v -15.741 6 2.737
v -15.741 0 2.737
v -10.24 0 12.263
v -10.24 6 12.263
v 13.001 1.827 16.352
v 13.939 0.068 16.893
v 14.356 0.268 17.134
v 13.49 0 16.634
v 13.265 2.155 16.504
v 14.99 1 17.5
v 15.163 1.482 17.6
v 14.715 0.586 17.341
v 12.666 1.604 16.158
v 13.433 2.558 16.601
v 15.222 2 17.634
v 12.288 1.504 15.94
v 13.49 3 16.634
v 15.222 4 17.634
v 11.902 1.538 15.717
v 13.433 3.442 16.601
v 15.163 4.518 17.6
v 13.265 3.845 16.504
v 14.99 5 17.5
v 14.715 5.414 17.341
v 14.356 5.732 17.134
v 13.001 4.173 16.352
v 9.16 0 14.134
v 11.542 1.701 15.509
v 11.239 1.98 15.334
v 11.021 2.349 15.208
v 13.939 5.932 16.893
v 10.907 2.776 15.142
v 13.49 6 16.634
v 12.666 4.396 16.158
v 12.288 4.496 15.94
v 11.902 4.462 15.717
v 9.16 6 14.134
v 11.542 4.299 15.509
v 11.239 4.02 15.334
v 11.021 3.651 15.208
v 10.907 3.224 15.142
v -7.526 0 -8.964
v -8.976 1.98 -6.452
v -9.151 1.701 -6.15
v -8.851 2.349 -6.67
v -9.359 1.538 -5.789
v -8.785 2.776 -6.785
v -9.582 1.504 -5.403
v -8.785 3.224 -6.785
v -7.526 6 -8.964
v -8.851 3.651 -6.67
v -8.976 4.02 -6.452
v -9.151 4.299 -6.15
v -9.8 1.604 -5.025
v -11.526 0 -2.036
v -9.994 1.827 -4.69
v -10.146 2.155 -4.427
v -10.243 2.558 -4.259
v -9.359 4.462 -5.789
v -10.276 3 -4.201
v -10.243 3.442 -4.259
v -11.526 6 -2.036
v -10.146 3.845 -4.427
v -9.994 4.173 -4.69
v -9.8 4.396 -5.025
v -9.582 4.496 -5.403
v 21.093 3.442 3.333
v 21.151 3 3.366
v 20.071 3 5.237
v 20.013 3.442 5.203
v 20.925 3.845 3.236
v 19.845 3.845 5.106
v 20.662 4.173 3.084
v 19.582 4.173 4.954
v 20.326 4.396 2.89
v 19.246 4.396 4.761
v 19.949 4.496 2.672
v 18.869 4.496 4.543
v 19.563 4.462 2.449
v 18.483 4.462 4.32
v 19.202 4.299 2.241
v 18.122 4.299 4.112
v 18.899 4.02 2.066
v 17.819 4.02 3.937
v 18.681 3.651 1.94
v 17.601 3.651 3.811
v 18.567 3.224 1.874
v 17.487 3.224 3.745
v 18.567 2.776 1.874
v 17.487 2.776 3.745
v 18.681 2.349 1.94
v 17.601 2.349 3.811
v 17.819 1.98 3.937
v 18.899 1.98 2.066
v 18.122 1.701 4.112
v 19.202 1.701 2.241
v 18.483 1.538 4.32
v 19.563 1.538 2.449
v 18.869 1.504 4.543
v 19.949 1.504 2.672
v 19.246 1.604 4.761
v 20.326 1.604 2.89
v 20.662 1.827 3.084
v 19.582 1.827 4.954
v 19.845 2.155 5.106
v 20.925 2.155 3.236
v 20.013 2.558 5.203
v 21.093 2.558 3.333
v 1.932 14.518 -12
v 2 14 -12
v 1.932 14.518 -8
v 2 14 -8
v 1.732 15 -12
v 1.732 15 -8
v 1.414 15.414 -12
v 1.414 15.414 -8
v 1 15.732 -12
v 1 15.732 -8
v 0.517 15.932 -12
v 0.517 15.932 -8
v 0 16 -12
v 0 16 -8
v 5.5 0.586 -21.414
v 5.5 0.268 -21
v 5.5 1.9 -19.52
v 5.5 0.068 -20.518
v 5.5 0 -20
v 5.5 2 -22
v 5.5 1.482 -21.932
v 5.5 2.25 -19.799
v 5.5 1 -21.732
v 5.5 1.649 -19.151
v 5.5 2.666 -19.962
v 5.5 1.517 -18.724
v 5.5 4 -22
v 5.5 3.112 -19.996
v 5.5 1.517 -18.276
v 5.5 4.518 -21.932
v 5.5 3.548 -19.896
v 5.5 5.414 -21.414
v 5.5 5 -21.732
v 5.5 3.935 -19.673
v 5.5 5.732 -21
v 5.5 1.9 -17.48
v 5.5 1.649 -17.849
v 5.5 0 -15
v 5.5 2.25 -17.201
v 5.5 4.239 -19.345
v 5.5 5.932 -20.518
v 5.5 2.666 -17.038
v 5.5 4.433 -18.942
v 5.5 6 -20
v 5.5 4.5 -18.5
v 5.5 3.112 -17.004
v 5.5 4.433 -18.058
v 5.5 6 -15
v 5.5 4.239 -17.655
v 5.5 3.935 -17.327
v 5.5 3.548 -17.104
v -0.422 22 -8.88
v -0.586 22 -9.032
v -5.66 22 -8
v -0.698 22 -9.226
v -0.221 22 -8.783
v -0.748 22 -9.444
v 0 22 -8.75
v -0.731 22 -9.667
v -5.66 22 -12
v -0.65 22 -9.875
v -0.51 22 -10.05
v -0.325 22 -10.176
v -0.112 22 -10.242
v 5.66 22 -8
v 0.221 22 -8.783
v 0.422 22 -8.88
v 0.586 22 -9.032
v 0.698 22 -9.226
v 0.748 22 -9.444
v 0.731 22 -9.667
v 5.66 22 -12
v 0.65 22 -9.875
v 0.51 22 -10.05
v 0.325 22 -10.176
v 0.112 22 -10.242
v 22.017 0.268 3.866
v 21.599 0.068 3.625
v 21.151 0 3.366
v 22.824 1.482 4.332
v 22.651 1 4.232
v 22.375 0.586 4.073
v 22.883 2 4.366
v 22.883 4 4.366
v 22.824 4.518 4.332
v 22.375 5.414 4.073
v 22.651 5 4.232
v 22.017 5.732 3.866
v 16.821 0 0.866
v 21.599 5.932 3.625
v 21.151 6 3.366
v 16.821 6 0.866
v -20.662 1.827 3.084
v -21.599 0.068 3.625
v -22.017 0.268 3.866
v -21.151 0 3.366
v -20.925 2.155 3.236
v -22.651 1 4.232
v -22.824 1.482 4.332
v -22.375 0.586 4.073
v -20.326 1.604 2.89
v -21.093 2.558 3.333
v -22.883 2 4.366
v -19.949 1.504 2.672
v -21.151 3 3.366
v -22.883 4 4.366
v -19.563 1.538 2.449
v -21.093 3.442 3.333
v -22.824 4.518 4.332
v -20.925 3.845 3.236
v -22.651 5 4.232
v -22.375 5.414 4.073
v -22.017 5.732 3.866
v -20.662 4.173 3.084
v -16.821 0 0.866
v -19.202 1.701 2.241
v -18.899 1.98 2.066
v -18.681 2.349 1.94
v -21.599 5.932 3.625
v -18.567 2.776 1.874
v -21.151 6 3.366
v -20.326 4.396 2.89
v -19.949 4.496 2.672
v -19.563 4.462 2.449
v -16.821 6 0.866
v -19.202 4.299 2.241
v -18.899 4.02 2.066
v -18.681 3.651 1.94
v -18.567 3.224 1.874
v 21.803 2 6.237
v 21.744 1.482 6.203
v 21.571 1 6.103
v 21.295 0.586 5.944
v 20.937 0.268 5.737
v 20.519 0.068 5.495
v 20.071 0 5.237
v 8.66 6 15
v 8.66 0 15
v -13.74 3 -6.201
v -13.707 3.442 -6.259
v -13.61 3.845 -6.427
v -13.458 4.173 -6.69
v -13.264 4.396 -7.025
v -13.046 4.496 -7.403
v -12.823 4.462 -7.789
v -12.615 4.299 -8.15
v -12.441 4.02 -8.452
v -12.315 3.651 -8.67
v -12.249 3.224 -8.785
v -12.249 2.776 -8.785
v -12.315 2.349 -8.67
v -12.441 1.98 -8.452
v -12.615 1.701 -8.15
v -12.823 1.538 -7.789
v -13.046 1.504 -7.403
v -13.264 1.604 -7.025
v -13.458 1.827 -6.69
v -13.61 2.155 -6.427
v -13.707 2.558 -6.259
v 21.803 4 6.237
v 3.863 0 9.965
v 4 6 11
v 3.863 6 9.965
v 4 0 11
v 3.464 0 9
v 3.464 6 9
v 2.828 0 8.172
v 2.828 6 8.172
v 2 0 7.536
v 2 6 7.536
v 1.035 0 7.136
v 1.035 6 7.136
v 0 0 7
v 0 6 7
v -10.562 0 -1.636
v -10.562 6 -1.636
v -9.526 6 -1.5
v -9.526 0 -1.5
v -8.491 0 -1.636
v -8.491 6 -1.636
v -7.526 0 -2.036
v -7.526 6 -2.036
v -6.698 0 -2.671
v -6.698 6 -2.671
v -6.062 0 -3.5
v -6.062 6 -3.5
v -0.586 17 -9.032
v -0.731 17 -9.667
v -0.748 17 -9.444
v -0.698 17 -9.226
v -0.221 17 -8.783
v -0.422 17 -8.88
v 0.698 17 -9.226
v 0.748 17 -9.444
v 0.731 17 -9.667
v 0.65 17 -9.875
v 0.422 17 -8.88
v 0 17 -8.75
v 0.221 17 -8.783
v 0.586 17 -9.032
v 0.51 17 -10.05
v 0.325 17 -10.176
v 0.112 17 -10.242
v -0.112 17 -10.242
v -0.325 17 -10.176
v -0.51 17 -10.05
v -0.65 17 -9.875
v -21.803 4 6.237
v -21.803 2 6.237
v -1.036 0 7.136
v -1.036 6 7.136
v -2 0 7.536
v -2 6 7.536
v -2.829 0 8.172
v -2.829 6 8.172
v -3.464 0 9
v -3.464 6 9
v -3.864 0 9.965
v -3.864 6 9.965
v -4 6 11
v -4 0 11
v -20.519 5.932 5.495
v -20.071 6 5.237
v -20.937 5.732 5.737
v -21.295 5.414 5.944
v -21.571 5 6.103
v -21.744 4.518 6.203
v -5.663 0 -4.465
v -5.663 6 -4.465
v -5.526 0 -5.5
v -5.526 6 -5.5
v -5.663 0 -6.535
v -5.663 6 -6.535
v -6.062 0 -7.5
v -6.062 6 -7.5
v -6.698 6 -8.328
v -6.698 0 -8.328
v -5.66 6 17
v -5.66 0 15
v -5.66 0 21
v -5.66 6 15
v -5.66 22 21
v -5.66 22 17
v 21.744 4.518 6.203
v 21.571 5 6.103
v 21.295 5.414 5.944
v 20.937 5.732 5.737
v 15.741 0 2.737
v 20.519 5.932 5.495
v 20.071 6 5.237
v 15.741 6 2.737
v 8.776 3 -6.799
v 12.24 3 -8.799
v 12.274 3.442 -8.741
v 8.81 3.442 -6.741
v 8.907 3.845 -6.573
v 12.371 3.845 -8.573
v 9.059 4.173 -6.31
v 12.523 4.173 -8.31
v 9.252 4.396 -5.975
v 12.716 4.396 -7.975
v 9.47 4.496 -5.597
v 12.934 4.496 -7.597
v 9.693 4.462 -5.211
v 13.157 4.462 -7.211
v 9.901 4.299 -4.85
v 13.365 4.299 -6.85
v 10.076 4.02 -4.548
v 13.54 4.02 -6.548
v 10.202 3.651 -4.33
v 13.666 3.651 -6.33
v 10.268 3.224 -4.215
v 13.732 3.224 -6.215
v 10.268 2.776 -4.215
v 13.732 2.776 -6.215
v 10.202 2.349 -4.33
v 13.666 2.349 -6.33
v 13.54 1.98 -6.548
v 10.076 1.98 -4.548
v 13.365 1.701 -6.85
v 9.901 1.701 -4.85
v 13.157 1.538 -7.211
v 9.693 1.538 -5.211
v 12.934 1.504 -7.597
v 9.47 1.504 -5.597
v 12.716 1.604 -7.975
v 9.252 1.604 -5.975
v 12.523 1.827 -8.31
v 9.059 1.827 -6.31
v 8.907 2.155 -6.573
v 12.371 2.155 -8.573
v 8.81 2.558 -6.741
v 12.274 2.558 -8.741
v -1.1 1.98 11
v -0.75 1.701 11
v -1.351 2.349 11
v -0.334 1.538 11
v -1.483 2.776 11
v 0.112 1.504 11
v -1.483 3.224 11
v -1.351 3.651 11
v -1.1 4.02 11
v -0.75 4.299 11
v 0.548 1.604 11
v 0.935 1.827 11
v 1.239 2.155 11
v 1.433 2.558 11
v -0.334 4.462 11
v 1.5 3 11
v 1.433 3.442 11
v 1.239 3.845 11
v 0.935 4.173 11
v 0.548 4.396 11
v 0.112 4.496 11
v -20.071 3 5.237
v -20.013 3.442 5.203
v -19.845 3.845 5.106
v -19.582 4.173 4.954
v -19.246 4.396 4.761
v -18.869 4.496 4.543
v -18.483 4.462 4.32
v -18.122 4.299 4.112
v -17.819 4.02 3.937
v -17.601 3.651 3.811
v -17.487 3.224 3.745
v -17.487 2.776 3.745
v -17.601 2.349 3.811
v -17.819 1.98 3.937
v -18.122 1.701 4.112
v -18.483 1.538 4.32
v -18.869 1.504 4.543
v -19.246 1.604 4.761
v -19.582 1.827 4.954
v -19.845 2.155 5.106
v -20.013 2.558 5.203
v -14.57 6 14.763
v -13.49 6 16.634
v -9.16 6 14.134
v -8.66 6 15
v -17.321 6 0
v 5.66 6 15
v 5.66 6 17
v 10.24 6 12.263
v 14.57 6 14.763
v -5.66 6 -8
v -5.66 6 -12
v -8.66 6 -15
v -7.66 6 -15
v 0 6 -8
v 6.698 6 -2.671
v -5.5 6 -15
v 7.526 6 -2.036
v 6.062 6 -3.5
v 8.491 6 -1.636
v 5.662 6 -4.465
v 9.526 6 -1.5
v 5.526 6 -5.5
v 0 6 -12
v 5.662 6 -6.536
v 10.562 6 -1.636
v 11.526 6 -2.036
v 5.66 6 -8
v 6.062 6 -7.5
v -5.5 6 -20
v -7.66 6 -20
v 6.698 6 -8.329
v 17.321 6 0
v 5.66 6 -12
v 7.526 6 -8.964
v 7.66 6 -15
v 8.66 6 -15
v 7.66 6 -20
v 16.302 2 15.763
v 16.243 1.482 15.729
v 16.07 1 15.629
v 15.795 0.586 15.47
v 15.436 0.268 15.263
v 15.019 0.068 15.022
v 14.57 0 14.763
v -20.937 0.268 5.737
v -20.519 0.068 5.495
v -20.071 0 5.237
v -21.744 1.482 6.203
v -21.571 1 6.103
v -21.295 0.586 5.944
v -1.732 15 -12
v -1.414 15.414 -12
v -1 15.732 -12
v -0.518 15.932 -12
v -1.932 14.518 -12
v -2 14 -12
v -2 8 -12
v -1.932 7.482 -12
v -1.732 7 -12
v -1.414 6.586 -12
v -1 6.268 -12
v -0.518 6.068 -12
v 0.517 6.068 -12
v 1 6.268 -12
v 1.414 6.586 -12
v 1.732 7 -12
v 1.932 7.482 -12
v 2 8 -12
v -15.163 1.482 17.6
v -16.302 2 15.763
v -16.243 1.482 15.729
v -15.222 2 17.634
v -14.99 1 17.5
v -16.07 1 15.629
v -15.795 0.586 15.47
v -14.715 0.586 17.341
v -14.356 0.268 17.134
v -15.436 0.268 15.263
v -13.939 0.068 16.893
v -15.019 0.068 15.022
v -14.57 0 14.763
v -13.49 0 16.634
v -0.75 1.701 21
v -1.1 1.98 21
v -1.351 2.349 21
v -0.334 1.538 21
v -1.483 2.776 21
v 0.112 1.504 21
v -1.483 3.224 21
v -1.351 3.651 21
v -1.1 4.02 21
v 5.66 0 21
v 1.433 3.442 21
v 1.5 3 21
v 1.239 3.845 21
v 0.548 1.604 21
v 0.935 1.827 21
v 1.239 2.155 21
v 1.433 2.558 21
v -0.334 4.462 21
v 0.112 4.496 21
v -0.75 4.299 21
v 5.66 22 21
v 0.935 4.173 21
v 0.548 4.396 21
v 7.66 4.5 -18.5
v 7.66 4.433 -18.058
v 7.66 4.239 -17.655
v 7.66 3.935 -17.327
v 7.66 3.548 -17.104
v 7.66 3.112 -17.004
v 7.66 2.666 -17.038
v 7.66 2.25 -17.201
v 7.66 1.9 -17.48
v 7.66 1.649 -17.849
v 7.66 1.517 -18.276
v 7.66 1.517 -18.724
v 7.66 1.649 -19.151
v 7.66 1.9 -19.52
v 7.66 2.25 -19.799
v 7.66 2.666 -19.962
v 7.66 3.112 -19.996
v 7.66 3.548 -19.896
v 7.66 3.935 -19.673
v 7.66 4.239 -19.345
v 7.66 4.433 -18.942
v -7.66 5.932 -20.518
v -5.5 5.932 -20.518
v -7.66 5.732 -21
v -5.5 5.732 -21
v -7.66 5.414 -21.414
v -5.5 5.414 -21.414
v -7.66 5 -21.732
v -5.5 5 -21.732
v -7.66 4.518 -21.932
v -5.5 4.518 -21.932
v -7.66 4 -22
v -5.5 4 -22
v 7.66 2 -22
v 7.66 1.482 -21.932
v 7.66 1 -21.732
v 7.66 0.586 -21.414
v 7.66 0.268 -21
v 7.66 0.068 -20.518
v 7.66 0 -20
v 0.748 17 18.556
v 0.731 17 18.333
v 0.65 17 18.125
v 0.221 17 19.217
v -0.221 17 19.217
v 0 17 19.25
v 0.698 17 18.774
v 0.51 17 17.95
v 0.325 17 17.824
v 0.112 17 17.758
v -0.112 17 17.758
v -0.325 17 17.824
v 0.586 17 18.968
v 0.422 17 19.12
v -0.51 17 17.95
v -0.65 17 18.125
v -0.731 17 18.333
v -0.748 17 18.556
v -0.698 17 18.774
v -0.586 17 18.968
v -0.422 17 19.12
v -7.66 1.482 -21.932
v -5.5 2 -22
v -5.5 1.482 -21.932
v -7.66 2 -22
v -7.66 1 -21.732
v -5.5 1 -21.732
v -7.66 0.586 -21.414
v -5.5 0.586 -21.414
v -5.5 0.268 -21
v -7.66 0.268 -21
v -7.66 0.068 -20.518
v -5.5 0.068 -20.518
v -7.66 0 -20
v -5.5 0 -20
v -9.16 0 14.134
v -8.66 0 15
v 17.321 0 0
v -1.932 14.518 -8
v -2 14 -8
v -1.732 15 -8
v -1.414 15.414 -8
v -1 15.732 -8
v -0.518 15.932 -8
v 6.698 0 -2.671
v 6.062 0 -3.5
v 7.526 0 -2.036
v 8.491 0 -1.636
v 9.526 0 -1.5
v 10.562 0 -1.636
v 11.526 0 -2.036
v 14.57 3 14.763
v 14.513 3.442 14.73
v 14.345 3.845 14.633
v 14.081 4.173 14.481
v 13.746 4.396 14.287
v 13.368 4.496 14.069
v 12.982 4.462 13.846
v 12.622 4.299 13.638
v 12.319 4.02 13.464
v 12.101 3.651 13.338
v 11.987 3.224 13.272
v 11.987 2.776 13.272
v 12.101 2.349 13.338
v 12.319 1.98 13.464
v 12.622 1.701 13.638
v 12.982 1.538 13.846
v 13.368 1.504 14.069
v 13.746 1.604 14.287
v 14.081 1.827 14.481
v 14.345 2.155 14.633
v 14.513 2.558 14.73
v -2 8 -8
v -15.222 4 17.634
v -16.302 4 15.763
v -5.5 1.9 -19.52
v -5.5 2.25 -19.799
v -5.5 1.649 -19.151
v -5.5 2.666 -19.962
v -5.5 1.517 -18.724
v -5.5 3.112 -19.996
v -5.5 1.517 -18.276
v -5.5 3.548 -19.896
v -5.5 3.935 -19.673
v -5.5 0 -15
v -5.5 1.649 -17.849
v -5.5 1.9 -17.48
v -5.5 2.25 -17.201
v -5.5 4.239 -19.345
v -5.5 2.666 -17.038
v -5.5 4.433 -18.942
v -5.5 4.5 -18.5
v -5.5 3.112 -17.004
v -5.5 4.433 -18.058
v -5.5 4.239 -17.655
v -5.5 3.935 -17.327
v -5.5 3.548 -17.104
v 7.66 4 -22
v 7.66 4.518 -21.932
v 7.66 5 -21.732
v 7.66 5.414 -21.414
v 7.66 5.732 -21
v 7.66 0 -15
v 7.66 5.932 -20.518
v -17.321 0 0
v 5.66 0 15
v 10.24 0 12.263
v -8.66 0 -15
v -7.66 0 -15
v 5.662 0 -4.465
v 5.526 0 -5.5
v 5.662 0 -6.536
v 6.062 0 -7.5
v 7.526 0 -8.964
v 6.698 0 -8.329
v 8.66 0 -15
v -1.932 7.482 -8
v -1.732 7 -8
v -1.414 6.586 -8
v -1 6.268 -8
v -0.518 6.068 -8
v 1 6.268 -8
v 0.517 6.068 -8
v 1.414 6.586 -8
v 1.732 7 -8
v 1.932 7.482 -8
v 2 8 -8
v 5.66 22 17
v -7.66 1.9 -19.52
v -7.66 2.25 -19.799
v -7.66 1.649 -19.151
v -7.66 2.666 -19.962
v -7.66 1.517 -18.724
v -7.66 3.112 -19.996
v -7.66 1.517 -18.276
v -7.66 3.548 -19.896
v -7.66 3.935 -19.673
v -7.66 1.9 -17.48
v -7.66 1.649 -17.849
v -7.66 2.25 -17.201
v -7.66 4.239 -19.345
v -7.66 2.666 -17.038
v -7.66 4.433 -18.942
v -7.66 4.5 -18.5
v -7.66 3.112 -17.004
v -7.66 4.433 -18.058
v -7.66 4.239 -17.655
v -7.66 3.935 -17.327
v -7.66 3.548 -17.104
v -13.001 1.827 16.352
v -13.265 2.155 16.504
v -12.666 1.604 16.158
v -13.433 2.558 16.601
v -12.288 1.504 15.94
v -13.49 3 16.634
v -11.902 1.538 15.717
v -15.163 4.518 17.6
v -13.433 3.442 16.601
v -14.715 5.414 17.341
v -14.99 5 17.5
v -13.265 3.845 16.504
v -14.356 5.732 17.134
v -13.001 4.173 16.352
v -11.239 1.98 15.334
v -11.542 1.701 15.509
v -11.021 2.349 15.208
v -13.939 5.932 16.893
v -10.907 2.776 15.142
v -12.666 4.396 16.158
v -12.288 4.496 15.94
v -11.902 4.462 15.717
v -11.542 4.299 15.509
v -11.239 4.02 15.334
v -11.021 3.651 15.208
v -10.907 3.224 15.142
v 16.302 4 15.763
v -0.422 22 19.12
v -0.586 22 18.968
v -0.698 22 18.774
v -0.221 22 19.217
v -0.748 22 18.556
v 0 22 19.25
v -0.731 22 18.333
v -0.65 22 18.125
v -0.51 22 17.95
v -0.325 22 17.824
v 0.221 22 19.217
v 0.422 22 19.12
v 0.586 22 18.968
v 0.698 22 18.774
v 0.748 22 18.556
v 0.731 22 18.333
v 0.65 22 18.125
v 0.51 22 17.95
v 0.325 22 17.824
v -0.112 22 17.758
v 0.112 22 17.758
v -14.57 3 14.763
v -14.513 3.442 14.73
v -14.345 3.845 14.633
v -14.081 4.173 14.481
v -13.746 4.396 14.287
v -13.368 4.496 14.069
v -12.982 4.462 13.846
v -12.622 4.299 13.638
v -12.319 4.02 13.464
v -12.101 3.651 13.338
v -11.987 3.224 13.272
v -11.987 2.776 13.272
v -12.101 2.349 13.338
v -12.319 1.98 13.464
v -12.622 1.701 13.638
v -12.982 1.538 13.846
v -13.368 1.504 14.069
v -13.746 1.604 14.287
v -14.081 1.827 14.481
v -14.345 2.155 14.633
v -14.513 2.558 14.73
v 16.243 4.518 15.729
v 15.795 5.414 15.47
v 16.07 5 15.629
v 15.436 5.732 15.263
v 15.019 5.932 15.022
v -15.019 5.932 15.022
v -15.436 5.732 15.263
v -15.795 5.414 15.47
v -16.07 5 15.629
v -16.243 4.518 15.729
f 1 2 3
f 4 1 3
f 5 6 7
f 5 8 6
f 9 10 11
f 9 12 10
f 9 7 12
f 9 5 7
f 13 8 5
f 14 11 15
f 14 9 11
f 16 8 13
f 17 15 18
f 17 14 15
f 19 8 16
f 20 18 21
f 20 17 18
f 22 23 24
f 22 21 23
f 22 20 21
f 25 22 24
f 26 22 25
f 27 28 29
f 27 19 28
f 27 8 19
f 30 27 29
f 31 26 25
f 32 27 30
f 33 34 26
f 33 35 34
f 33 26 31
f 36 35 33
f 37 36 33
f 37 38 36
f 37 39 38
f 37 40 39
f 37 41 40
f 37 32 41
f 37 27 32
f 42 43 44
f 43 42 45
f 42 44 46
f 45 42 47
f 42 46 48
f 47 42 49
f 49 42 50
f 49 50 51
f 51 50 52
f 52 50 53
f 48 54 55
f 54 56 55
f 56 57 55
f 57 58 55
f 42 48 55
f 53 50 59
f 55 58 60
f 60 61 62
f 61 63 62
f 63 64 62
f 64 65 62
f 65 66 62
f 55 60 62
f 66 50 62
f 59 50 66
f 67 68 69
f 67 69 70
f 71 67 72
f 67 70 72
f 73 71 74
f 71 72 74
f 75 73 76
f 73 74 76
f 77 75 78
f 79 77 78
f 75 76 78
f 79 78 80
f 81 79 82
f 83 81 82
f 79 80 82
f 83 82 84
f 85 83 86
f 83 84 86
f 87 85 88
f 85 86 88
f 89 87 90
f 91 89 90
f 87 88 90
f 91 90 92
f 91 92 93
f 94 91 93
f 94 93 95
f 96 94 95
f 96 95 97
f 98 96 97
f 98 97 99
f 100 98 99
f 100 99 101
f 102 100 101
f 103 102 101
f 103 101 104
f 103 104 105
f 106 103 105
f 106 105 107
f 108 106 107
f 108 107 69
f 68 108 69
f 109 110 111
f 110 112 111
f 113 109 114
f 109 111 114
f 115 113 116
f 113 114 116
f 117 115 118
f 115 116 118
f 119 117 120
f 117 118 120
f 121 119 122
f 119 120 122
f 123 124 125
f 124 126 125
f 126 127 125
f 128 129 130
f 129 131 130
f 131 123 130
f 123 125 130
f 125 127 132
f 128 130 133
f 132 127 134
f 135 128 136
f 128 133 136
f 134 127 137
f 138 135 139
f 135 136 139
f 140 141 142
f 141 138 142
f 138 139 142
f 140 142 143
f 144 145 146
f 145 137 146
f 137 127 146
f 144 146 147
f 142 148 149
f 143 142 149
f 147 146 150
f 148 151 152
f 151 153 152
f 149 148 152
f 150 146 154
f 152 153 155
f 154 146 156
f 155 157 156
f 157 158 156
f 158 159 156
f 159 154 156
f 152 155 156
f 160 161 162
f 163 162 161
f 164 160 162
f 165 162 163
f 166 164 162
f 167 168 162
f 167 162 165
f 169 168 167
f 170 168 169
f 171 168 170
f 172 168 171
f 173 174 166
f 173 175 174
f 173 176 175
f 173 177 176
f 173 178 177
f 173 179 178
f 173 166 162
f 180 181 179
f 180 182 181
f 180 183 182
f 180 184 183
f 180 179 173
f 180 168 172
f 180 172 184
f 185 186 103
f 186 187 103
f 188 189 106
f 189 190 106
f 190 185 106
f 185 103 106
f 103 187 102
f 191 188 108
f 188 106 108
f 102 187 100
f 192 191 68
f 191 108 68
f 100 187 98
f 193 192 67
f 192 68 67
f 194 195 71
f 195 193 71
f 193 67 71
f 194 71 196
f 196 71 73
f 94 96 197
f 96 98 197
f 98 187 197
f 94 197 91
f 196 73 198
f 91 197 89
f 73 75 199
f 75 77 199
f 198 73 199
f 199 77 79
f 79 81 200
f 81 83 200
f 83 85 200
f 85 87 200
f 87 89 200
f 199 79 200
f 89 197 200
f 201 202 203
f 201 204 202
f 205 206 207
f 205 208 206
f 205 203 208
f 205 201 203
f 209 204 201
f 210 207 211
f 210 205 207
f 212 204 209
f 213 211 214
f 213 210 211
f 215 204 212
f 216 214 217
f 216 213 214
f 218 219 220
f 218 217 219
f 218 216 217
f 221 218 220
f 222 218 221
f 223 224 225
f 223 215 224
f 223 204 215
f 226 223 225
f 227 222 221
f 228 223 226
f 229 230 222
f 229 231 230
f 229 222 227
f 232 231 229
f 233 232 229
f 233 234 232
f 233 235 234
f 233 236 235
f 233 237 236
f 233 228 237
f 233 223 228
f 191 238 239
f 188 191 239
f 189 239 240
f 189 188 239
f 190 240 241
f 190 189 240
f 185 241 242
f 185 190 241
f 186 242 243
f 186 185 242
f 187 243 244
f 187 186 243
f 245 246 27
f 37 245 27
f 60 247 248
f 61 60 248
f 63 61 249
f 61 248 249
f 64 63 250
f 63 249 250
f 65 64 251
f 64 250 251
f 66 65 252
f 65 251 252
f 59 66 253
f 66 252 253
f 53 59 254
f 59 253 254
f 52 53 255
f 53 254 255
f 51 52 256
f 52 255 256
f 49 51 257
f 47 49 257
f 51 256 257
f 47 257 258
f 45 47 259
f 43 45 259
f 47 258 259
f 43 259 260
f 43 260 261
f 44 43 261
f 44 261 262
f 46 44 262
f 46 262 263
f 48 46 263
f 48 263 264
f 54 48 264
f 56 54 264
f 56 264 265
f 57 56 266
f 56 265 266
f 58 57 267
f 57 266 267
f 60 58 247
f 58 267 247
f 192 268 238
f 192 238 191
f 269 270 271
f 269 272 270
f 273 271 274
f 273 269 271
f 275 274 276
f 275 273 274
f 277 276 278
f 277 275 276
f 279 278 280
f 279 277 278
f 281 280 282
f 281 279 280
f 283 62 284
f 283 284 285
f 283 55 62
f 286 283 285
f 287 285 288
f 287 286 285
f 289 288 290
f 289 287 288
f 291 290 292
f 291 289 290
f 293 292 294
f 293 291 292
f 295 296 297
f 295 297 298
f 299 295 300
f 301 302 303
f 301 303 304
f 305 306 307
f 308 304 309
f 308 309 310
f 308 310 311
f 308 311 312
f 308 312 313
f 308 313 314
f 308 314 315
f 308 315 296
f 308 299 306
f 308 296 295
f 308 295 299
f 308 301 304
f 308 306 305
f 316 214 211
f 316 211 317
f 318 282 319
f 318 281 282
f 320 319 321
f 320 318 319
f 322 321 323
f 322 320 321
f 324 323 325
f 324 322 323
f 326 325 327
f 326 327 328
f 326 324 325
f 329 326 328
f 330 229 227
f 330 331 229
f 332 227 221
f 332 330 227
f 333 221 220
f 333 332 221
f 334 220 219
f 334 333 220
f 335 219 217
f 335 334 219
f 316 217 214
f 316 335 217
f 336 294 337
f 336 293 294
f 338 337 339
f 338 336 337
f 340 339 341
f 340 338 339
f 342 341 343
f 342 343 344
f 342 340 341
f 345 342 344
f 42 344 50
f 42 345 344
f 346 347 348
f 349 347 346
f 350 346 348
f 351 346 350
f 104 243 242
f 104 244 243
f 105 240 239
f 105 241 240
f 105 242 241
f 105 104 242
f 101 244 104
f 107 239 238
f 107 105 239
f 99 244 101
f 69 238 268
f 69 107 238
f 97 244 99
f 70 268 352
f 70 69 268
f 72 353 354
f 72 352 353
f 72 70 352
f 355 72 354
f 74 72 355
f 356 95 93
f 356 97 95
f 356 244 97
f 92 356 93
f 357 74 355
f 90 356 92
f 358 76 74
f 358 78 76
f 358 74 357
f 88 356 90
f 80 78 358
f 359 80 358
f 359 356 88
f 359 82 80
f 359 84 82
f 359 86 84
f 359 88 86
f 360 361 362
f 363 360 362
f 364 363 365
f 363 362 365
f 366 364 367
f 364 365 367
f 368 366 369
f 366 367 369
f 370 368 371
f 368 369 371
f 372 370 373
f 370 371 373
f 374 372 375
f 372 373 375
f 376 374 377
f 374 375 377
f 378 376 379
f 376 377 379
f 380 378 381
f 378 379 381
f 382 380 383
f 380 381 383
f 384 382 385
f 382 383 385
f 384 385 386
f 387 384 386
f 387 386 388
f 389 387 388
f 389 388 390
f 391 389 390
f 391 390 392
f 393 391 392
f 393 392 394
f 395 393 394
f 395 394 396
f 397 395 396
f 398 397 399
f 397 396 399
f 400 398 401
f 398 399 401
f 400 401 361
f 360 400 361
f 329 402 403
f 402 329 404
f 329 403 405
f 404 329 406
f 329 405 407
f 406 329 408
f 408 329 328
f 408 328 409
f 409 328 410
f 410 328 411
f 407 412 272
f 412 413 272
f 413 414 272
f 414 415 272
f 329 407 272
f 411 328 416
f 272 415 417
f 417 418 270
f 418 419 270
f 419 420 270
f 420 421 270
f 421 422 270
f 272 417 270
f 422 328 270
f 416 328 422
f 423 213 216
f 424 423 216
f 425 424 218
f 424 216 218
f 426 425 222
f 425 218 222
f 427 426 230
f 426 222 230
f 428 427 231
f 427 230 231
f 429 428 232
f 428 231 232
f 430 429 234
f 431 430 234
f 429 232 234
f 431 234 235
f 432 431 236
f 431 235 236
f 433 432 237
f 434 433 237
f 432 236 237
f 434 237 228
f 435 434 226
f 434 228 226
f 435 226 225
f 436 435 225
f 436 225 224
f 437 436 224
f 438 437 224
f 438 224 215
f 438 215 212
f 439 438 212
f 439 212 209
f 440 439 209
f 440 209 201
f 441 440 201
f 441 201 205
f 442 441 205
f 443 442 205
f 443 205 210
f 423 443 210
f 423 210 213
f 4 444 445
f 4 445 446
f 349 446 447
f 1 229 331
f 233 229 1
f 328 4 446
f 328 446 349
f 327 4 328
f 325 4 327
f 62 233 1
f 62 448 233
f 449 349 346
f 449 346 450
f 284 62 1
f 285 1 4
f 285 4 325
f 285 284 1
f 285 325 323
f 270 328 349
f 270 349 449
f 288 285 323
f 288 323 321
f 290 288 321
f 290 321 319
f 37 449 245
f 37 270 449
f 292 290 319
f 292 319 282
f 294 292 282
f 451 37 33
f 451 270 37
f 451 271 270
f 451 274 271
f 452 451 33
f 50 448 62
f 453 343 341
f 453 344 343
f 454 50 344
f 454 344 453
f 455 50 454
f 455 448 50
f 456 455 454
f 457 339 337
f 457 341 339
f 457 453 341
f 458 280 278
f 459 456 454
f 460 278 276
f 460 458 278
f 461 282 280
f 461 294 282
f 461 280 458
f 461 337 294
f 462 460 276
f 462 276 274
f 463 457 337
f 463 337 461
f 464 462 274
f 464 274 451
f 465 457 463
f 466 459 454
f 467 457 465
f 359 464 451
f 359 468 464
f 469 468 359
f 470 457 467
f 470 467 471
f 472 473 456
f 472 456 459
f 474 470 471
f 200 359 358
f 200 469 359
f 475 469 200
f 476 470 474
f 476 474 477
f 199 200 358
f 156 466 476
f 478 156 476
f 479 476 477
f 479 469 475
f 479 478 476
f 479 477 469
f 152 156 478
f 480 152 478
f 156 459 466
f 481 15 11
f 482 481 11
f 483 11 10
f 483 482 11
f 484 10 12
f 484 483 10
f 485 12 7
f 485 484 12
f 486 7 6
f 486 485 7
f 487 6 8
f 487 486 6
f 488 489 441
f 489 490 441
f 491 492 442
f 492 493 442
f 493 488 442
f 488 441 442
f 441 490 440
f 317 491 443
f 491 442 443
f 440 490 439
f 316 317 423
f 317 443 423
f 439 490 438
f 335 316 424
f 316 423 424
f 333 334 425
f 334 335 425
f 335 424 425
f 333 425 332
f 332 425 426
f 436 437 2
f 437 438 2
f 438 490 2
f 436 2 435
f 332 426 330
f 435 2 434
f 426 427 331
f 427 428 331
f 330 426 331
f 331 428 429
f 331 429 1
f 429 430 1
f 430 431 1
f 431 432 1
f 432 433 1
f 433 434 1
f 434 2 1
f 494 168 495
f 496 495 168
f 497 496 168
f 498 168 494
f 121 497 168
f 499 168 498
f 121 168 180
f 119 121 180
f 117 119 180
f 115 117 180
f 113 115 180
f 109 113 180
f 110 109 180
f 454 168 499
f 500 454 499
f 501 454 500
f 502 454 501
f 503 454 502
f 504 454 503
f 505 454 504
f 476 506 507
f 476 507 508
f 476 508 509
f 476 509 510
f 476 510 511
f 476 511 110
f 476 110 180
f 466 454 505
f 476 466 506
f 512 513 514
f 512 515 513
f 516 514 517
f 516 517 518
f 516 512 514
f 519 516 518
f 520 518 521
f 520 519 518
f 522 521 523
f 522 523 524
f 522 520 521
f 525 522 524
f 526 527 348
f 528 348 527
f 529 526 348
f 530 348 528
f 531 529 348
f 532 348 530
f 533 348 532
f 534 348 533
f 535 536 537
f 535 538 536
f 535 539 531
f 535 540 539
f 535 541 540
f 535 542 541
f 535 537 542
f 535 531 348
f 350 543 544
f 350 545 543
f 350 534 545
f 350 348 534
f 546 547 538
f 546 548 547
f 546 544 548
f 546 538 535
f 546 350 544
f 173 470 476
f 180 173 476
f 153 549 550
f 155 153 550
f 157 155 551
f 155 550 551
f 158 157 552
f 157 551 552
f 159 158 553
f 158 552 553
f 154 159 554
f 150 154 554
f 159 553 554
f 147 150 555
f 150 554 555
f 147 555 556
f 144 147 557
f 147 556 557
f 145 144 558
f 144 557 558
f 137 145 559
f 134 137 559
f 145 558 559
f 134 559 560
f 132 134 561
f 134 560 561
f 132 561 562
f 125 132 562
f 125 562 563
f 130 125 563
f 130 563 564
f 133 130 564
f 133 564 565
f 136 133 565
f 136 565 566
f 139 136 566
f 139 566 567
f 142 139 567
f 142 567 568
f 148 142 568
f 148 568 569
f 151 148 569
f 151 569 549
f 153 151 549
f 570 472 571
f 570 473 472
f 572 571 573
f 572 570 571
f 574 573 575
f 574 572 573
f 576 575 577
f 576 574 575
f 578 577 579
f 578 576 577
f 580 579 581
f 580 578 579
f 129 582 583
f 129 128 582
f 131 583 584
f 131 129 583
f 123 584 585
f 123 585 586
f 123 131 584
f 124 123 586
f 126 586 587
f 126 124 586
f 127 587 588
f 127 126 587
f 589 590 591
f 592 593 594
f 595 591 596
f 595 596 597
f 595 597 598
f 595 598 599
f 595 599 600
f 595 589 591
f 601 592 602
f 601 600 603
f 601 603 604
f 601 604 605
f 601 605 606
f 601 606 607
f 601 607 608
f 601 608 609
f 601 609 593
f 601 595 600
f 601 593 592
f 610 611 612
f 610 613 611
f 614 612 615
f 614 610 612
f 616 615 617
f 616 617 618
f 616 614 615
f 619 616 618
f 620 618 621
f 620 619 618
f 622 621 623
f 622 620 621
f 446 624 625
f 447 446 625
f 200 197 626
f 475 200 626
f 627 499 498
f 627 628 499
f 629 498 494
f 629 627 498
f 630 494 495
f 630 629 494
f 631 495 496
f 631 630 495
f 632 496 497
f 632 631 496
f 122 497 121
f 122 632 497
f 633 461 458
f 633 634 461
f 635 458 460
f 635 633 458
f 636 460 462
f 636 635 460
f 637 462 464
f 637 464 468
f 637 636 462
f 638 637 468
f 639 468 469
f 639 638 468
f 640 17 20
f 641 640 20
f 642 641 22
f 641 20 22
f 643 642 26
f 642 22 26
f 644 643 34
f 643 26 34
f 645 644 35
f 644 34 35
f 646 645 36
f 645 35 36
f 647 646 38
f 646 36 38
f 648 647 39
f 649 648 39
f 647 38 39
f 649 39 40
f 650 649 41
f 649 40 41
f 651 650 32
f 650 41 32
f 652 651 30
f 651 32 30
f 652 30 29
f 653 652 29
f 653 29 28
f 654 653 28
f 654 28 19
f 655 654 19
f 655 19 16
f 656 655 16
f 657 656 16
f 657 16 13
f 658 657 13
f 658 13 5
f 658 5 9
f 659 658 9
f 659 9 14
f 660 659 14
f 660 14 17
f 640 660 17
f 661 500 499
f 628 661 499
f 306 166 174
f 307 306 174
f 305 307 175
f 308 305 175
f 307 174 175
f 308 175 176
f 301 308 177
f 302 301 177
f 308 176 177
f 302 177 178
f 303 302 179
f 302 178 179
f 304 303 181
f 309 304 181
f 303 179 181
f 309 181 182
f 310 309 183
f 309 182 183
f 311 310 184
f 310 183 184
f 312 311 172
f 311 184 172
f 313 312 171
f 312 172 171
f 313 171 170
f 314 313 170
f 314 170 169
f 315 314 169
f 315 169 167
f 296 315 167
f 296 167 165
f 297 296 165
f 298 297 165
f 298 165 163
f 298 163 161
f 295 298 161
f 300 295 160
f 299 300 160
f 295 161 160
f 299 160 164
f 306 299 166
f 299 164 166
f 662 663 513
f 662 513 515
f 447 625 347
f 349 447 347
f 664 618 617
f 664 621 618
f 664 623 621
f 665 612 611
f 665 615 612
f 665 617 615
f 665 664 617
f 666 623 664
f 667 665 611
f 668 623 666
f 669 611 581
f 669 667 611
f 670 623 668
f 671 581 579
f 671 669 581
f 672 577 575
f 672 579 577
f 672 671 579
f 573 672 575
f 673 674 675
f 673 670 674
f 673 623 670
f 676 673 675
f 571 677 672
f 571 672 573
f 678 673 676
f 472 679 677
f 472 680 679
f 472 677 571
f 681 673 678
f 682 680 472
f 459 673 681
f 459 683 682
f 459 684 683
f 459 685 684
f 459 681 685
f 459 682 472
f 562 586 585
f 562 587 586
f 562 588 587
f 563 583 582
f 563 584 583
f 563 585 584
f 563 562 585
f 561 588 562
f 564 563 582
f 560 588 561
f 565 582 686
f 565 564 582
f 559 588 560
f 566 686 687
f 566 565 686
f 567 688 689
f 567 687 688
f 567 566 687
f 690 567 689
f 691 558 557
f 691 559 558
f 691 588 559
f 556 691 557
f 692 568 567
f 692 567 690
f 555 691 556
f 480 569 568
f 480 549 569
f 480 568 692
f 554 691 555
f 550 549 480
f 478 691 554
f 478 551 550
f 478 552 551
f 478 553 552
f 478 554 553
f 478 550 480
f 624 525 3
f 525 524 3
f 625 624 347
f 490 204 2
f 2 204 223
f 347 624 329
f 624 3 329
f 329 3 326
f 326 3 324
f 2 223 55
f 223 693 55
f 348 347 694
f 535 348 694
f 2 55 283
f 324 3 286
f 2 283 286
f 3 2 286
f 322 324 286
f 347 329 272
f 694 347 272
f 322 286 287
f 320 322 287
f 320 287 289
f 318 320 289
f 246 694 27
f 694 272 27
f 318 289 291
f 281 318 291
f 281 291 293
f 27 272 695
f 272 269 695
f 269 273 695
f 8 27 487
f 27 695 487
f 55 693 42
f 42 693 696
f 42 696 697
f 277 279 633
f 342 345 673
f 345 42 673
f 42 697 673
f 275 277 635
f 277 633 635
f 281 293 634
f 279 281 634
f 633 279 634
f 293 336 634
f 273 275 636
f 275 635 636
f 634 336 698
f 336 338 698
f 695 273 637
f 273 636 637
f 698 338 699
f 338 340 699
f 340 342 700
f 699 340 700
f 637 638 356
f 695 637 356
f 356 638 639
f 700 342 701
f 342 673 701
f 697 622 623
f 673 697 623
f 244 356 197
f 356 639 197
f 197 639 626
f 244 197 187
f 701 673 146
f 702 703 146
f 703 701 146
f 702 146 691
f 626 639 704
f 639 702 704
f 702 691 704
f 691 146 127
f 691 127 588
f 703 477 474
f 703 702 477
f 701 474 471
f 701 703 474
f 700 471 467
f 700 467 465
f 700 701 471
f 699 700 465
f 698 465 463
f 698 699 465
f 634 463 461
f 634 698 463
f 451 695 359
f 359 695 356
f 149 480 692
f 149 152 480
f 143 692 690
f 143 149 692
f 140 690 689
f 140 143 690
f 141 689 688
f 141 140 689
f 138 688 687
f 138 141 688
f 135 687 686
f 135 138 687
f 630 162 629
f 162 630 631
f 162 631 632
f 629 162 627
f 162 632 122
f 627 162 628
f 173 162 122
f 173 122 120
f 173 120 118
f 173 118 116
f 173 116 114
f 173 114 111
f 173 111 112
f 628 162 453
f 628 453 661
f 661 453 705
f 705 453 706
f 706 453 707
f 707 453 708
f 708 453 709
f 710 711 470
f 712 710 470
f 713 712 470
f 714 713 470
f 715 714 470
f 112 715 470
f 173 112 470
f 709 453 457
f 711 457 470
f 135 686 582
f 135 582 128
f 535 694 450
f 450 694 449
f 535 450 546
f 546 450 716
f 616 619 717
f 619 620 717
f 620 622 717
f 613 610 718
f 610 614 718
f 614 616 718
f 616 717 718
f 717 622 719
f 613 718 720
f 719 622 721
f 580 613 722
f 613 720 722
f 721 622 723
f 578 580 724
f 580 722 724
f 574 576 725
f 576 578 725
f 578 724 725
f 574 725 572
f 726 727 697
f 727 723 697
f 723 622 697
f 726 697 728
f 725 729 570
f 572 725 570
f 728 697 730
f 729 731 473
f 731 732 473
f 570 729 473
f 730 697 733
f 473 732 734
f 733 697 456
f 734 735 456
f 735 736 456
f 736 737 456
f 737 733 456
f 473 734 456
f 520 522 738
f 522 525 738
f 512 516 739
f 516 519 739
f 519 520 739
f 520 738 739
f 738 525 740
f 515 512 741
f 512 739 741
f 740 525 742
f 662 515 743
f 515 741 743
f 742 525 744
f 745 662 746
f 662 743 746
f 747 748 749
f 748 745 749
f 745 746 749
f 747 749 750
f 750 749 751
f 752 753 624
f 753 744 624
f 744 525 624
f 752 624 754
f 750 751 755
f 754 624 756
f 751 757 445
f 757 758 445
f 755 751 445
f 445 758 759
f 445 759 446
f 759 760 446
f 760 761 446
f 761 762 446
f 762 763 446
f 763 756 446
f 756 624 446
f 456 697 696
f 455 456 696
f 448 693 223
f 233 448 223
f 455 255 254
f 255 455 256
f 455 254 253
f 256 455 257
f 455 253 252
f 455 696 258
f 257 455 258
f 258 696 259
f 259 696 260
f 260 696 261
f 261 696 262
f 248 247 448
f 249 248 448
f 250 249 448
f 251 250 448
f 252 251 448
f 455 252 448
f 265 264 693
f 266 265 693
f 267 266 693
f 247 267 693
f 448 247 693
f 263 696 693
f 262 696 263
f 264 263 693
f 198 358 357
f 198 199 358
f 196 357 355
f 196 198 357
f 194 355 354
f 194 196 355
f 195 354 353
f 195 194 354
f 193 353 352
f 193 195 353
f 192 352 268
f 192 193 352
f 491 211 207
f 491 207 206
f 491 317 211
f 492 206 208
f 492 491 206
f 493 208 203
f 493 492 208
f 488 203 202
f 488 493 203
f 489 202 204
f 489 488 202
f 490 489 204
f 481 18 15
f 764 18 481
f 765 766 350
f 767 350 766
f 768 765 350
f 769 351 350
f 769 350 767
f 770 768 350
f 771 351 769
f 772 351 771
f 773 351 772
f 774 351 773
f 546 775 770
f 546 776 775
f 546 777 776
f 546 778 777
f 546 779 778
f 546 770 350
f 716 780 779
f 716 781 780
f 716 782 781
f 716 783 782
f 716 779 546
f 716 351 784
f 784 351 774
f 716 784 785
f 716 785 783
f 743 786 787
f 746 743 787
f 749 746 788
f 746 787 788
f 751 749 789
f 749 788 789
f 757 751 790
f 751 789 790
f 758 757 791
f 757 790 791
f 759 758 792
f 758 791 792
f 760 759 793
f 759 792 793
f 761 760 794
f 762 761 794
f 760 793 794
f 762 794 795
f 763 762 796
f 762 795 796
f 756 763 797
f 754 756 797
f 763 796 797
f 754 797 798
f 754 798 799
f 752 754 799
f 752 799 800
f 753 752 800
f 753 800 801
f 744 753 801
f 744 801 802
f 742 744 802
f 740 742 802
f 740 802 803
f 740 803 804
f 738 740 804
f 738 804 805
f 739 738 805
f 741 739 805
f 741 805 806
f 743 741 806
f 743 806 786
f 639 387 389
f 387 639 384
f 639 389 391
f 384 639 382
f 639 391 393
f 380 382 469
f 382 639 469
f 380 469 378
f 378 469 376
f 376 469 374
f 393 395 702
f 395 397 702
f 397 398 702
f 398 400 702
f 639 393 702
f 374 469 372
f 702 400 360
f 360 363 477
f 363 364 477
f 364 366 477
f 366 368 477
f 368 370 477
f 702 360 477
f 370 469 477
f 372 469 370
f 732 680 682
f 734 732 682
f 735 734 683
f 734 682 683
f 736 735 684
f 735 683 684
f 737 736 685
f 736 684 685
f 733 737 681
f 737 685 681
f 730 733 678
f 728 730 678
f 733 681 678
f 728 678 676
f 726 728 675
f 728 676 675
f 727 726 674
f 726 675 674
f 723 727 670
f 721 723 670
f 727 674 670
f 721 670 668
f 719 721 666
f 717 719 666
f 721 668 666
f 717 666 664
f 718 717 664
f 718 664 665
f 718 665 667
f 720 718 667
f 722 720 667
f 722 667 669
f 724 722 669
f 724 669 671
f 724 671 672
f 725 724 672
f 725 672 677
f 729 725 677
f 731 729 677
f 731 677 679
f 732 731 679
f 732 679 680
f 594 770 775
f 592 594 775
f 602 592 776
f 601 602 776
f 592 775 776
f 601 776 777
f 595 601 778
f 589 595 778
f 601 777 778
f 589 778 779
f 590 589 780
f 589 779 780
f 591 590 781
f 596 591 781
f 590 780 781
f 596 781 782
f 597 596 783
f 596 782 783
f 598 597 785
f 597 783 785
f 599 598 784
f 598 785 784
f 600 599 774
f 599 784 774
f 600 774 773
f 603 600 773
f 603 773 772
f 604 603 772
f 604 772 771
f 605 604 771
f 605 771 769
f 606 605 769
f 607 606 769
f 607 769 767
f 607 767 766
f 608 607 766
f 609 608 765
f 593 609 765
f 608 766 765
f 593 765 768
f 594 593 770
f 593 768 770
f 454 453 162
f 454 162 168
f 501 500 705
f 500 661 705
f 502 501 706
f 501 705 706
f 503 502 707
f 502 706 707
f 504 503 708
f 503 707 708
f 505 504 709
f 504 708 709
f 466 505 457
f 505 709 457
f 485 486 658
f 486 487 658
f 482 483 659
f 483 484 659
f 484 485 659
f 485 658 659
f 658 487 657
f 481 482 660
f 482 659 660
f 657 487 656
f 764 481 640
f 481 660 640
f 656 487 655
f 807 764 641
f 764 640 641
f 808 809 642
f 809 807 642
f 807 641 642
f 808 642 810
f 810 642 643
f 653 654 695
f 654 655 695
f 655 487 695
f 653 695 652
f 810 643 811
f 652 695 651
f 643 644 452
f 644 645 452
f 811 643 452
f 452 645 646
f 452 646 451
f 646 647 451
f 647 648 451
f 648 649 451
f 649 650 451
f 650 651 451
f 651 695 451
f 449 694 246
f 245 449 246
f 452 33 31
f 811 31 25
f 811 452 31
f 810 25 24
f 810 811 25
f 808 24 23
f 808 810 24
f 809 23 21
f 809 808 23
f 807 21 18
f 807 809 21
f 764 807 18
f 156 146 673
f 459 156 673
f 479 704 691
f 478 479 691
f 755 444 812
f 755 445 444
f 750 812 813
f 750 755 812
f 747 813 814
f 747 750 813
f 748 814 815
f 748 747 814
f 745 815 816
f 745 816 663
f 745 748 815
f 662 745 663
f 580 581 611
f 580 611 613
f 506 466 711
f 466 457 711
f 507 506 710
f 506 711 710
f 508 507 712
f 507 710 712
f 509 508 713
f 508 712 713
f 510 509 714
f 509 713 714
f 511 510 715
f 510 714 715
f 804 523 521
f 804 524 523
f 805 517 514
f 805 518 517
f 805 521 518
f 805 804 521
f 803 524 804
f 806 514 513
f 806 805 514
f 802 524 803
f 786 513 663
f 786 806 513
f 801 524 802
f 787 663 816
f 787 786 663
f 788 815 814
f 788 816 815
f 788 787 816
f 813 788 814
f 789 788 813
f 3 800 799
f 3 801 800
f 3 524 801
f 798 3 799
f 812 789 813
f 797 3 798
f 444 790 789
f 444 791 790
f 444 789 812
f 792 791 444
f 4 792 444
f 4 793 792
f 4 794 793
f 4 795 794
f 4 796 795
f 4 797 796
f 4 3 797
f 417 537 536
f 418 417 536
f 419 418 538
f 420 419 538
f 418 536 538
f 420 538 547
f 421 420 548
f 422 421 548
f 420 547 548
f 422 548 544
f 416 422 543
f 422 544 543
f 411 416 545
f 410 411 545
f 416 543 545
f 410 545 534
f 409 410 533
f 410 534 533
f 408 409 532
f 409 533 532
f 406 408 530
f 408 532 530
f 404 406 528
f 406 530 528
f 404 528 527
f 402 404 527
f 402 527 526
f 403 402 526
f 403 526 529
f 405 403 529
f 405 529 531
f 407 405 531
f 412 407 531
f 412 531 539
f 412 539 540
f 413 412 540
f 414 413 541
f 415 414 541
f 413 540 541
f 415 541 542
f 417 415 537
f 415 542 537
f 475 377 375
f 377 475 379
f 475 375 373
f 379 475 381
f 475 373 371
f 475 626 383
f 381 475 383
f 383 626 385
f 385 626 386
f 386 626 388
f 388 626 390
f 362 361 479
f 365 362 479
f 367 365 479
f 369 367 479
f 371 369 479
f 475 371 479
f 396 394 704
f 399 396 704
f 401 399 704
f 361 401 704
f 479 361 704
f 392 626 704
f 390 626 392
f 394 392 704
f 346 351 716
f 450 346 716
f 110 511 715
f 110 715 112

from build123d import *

# Parameters (mm, degrees)
BOSS_EXTRUDE1_DEPTH = 6
SKETCH2_W           = 2.16
SKETCH2_H           = 6
BOSS_EXTRUDE2_DEPTH = 7
SKETCH4_W           = 2.16
SKETCH4_H           = 6
BOSS_EXTRUDE3_DEPTH = 7
SKETCH5_W           = 2.16
SKETCH5_H           = 6
BOSS_EXTRUDE4_DEPTH = 7
SKETCH6_W           = 2.16
SKETCH6_H           = 6
BOSS_EXTRUDE5_DEPTH = 7
SKETCH7_W           = 2.16
SKETCH7_H           = 6
BOSS_EXTRUDE6_DEPTH = 7
SKETCH9_W           = 2.16
SKETCH9_H           = 6
BOSS_EXTRUDE7_DEPTH = 7
SKETCH11_W          = 11.320508076
SKETCH11_H          = 22
BOSS_EXTRUDE8_DEPTH = 6
SKETCH13_W          = 11.320508076
SKETCH13_H          = 2
CUT_EXTRUDE1_DEPTH  = 16
SKETCH14_W          = 11.320508076
SKETCH14_H          = 4
BOSS_EXTRUDE9_DEPTH = 16
SKETCH22_W          = 4
SKETCH22_H          = 10
CUT_EXTRUDE8_DEPTH  = 4
SKETCH23_R          = 1.5
CUT_EXTRUDE9_DEPTH  = 44.598981412
SKETCH24_R          = 1.5
CUT_EXTRUDE10_DEPTH = 45.916354208
SKETCH25_R          = 1.5
CUT_EXTRUDE11_DEPTH = 45.285561147
SKETCH26_W          = 8
SKETCH26_H          = 4
CUT_EXTRUDE12_DEPTH = 6
FILLET1_R           = 4
CUT_EXTRUDE13_DEPTH = 6
FILLET2_R           = 4
CUT_EXTRUDE14_DEPTH = 6
FILLET3_R           = 4
SKETCH34_R          = 1.5
CUT_EXTRUDE15_DEPTH = 4
SKETCH35_R          = 1.5
CUT_EXTRUDE16_DEPTH = 4
SKETCH36_R          = 1.5
CUT_EXTRUDE17_DEPTH = 10
FILLET4_R           = 2
FILLET5_R           = 2
SKETCH37_R          = 0.75
CUT_EXTRUDE19_DEPTH = 5
SKETCH39_R          = 0.75
CUT_EXTRUDE20_DEPTH = 5
FILLET6_R           = 2


with BuildPart() as part:
    # Sketch1 → Boss-Extrude1 (new body)
    with BuildSketch(Plane(origin=(0, 0, 0), x_dir=(1, 0, 0), z_dir=(0, 1, 0))):
        Polygon((17.320508076, 0), (8.660254038, 15), (-8.660254038, 15), (-17.320508076, 0), (-8.660254038, -15), (8.660254038, -15), align=None)
    extrude(amount=BOSS_EXTRUDE1_DEPTH)

    # Sketch2 → Boss-Extrude2 (add)
    with BuildSketch(Plane(origin=(12.990381057, 0, 7.5), x_dir=(0.4999999999999997, 0, -0.8660254037844388), z_dir=(0.8660254037844389, 0, 0.49999999999999983))):
        with Locations((-6.580254038, 3)):
            Rectangle(SKETCH2_W, SKETCH2_H)
    extrude(amount=BOSS_EXTRUDE2_DEPTH)

    # Sketch4 → Boss-Extrude3 (add)
    with BuildSketch(Plane(origin=(12.990381057, 0, 7.5), x_dir=(0.4999999999999997, 0, -0.8660254037844388), z_dir=(0.8660254037844389, 0, 0.49999999999999983))):
        with Locations((6.580254038, 3)):
            Rectangle(SKETCH4_W, SKETCH4_H)
    extrude(amount=BOSS_EXTRUDE3_DEPTH)

    # Sketch5 → Boss-Extrude4 (add)
    with BuildSketch(Plane(origin=(-12.990381057, 0, 7.5), x_dir=(0.4999999999999999, 0, 0.8660254037844387), z_dir=(-0.8660254037844388, 0, 0.49999999999999994))):
        with Locations((-6.580254038, 3)):
            Rectangle(SKETCH5_W, SKETCH5_H)
    extrude(amount=BOSS_EXTRUDE4_DEPTH)

    # Sketch6 → Boss-Extrude5 (add)
    with BuildSketch(Plane(origin=(-12.990381057, 0, 7.5), x_dir=(0.4999999999999999, 0, 0.8660254037844387), z_dir=(-0.8660254037844388, 0, 0.49999999999999994))):
        with Locations((6.580254038, 3)):
            Rectangle(SKETCH6_W, SKETCH6_H)
    extrude(amount=BOSS_EXTRUDE5_DEPTH)

    # Sketch7 → Boss-Extrude6 (add)
    with BuildSketch(Plane(origin=(0, 0, -15), x_dir=(-1, 0, 0), z_dir=(0, 0, -1))):
        with Locations((-6.580254038, 3)):
            Rectangle(SKETCH7_W, SKETCH7_H)
    extrude(amount=BOSS_EXTRUDE6_DEPTH)

    # Sketch9 → Boss-Extrude7 (add)
    with BuildSketch(Plane(origin=(0, 0, -15), x_dir=(-1, 0, 0), z_dir=(0, 0, -1))):
        with Locations((6.580254038, 3)):
            Rectangle(SKETCH9_W, SKETCH9_H)
    extrude(amount=BOSS_EXTRUDE7_DEPTH)

    # Sketch11 → Boss-Extrude8 (add)
    with BuildSketch(Plane.XY.offset(15)):
        with Locations((0, 11)):
            Rectangle(SKETCH11_W, SKETCH11_H)
    extrude(amount=BOSS_EXTRUDE8_DEPTH)

    # Sketch13 → Cut-Extrude1 (cut)
    with BuildSketch(Plane(origin=(0, 22, 0), x_dir=(1, 0, 0), z_dir=(0, 1, 0))):
        with Locations((0, -16)):
            Rectangle(SKETCH13_W, SKETCH13_H)
    extrude(amount=-CUT_EXTRUDE1_DEPTH, mode=Mode.SUBTRACT)

    # Sketch14 → Boss-Extrude9 (add)
    with BuildSketch(Plane(origin=(0, 6, 0), x_dir=(1, 0, 0), z_dir=(0, 1, 0))):
        with Locations((0, 10)):
            Rectangle(SKETCH14_W, SKETCH14_H)
    extrude(amount=BOSS_EXTRUDE9_DEPTH)

    # Sketch22 → Cut-Extrude8 (cut)
    with BuildSketch(Plane(origin=(0, 0, -12), x_dir=(-1, 0, 0), z_dir=(0, 0, -1))):
        with Locations((0.000254038, 11)):
            Rectangle(SKETCH22_W, SKETCH22_H)
    extrude(amount=-CUT_EXTRUDE8_DEPTH, mode=Mode.SUBTRACT)

    # Sketch23 → Cut-Extrude9 (cut, through all)
    with BuildSketch(Plane(origin=(7.660254038, 0, 0), x_dir=(0, 0, -1), z_dir=(1, 0, 0))):
        with Locations(Location((18.5, 3, 0), (0, 0, 90))):
            Circle(SKETCH23_R)
    extrude(amount=-CUT_EXTRUDE9_DEPTH, mode=Mode.SUBTRACT)

    # Sketch24 → Cut-Extrude10 (cut, through all)
    with BuildSketch(Plane(origin=(-3.830127019, 0, 6.633974596), x_dir=(0.8660254037844388, 0, 0.4999999999999997), z_dir=(-0.49999999999999983, 0, 0.8660254037844389))):
        with Locations((18.5, 3)):
            Circle(SKETCH24_R)
    extrude(amount=-CUT_EXTRUDE10_DEPTH, mode=Mode.SUBTRACT)

    # Sketch25 → Cut-Extrude11 (cut, through all)
    with BuildSketch(Plane(origin=(-3.830127019, 0, -6.633974596), x_dir=(-0.8660254037844387, 0, 0.4999999999999999), z_dir=(-0.4999999999999999, 0, -0.8660254037844387))):
        with Locations((18.5, 3)):
            Circle(SKETCH25_R)
    extrude(amount=-CUT_EXTRUDE11_DEPTH, mode=Mode.SUBTRACT)

    # Sketch26 → Cut-Extrude12 (cut)
    with BuildSketch(Plane(origin=(0, 6, 0), x_dir=(1, 0, 0), z_dir=(0, 1, 0))):
        with Locations((-0.000254038, -9)):
            Rectangle(SKETCH26_W, SKETCH26_H)
    extrude(amount=-CUT_EXTRUDE12_DEPTH, mode=Mode.SUBTRACT)

    # Fillet1
    fillet1_edges = [part.edges().sort_by_distance(p)[0] for p in [
        (-4.000254038, 3, 7),
        (3.999745962, 3, 7),
    ]]
    fillet(fillet1_edges, radius=FILLET1_R - 0.0001)  # a hair under: the kernel refuses the full size

    # Sketch32 → Cut-Extrude13 (cut)
    with BuildSketch(Plane(origin=(0, 6, 0), x_dir=(1, 0, 0), z_dir=(0, 1, 0))):
        Polygon((7.526152423, 8.964321618), (4.062050808, 6.964321618), (8.062304845, 0.035678382), (11.526406461, 2.035678382), align=None)
    extrude(amount=-CUT_EXTRUDE13_DEPTH, mode=Mode.SUBTRACT)

    # Fillet2
    fillet2_edges = [part.edges().sort_by_distance(p)[0] for p in [
        (8.062304845, 3, -0.035678382),
        (4.062050808, 3, -6.964321618),
    ]]
    fillet(fillet2_edges, radius=FILLET2_R - 0.0001)  # a hair under: the kernel refuses the full size

    # Sketch33 → Cut-Extrude14 (cut)
    with BuildSketch(Plane(origin=(0, 6, 0), x_dir=(1, 0, 0), z_dir=(0, 1, 0))):
        Polygon((-7.526406461, 8.963881612), (-11.526406461, 2.035678382), (-8.062304845, 0.035678382), (-4.062304845, 6.963881612), align=None)
    extrude(amount=-CUT_EXTRUDE14_DEPTH, mode=Mode.SUBTRACT)

    # Fillet3
    fillet3_edges = [part.edges().sort_by_distance(p)[0] for p in [
        (-8.062304845, 3, -0.035678382),
        (-4.062304845, 3, -6.963881612),
    ]]
    fillet(fillet3_edges, radius=FILLET3_R - 0.0001)  # a hair under: the kernel refuses the full size

    # Sketch34 → Cut-Extrude15 (cut)
    with BuildSketch(Plane(origin=(-12.990381057, 0, -7.5), x_dir=(-0.5, 0, 0.8660254037844386), z_dir=(-0.8660254037844387, 0, -0.5000000000000001))):
        with Locations((0, 3)):
            Circle(SKETCH34_R)
    extrude(amount=-CUT_EXTRUDE15_DEPTH, mode=Mode.SUBTRACT)

    # Sketch35 → Cut-Extrude16 (cut)
    with BuildSketch(Plane(origin=(12.990381057, 0, -7.5), x_dir=(-0.5000000000000003, 0, -0.8660254037844386), z_dir=(0.8660254037844385, 0, -0.5000000000000002))):
        with Locations((0, 3)):
            Circle(SKETCH35_R)
    extrude(amount=-CUT_EXTRUDE16_DEPTH, mode=Mode.SUBTRACT)

    # Sketch36 → Cut-Extrude17 (cut)
    with BuildSketch(Plane.XY.offset(21)):
        with Locations((0, 3)):
            Circle(SKETCH36_R)
    extrude(amount=-CUT_EXTRUDE17_DEPTH, mode=Mode.SUBTRACT)

    # Fillet4
    fillet4_edges = [part.edges().sort_by_distance(p)[0] for p in [
        (1.999745962, 16, -10),
        (-2.000254038, 16, -10),
    ]]
    fillet(fillet4_edges, radius=FILLET4_R - 0.0001)  # a hair under: the kernel refuses the full size

    # Fillet5
    fillet5_edges = [part.edges().sort_by_distance(p)[0] for p in [
        (1.999745962, 6, -10),
        (-2.000254038, 6, -10),
    ]]
    fillet(fillet5_edges, radius=FILLET5_R - 0.0001)  # a hair under: the kernel refuses the full size

    # Sketch37 → Cut-Extrude19 (cut)
    with BuildSketch(Plane(origin=(0, 22, 0), x_dir=(1, 0, 0), z_dir=(0, 1, 0))):
        with Locations(Location((0, 9.5, 0), (0, 0, 270))):
            Circle(SKETCH37_R)
    extrude(amount=-CUT_EXTRUDE19_DEPTH, mode=Mode.SUBTRACT)

    # Sketch39 → Cut-Extrude20 (cut)
    with BuildSketch(Plane(origin=(0, 22, 0), x_dir=(1, 0, 0), z_dir=(0, 1, 0))):
        with Locations(Location((0, -18.5, 0), (0, 0, 270))):
            Circle(SKETCH39_R)
    extrude(amount=-CUT_EXTRUDE20_DEPTH, mode=Mode.SUBTRACT)

    # Fillet6
    fillet6_edges = [part.edges().sort_by_distance(p)[0] for p in [
        (15.762431864, 6, 16.69866716),
        (15.762431864, 0, 16.69866716),
        (22.342685902, 0, 5.30133284),
        (22.342685902, 6, 5.30133284),
        (-22.342685902, 0, 5.30133284),
        (-22.342685902, 6, 5.30133284),
        (-15.762431864, 0, 16.69866716),
        (-15.762431864, 6, 16.69866716),
        (6.580254038, 6, -22),
        (6.580254038, 0, -22),
        (-6.580254038, 0, -22),
        (-6.580254038, 6, -22),
    ]]
    fillet(fillet6_edges, radius=FILLET6_R)


solid = part.part
